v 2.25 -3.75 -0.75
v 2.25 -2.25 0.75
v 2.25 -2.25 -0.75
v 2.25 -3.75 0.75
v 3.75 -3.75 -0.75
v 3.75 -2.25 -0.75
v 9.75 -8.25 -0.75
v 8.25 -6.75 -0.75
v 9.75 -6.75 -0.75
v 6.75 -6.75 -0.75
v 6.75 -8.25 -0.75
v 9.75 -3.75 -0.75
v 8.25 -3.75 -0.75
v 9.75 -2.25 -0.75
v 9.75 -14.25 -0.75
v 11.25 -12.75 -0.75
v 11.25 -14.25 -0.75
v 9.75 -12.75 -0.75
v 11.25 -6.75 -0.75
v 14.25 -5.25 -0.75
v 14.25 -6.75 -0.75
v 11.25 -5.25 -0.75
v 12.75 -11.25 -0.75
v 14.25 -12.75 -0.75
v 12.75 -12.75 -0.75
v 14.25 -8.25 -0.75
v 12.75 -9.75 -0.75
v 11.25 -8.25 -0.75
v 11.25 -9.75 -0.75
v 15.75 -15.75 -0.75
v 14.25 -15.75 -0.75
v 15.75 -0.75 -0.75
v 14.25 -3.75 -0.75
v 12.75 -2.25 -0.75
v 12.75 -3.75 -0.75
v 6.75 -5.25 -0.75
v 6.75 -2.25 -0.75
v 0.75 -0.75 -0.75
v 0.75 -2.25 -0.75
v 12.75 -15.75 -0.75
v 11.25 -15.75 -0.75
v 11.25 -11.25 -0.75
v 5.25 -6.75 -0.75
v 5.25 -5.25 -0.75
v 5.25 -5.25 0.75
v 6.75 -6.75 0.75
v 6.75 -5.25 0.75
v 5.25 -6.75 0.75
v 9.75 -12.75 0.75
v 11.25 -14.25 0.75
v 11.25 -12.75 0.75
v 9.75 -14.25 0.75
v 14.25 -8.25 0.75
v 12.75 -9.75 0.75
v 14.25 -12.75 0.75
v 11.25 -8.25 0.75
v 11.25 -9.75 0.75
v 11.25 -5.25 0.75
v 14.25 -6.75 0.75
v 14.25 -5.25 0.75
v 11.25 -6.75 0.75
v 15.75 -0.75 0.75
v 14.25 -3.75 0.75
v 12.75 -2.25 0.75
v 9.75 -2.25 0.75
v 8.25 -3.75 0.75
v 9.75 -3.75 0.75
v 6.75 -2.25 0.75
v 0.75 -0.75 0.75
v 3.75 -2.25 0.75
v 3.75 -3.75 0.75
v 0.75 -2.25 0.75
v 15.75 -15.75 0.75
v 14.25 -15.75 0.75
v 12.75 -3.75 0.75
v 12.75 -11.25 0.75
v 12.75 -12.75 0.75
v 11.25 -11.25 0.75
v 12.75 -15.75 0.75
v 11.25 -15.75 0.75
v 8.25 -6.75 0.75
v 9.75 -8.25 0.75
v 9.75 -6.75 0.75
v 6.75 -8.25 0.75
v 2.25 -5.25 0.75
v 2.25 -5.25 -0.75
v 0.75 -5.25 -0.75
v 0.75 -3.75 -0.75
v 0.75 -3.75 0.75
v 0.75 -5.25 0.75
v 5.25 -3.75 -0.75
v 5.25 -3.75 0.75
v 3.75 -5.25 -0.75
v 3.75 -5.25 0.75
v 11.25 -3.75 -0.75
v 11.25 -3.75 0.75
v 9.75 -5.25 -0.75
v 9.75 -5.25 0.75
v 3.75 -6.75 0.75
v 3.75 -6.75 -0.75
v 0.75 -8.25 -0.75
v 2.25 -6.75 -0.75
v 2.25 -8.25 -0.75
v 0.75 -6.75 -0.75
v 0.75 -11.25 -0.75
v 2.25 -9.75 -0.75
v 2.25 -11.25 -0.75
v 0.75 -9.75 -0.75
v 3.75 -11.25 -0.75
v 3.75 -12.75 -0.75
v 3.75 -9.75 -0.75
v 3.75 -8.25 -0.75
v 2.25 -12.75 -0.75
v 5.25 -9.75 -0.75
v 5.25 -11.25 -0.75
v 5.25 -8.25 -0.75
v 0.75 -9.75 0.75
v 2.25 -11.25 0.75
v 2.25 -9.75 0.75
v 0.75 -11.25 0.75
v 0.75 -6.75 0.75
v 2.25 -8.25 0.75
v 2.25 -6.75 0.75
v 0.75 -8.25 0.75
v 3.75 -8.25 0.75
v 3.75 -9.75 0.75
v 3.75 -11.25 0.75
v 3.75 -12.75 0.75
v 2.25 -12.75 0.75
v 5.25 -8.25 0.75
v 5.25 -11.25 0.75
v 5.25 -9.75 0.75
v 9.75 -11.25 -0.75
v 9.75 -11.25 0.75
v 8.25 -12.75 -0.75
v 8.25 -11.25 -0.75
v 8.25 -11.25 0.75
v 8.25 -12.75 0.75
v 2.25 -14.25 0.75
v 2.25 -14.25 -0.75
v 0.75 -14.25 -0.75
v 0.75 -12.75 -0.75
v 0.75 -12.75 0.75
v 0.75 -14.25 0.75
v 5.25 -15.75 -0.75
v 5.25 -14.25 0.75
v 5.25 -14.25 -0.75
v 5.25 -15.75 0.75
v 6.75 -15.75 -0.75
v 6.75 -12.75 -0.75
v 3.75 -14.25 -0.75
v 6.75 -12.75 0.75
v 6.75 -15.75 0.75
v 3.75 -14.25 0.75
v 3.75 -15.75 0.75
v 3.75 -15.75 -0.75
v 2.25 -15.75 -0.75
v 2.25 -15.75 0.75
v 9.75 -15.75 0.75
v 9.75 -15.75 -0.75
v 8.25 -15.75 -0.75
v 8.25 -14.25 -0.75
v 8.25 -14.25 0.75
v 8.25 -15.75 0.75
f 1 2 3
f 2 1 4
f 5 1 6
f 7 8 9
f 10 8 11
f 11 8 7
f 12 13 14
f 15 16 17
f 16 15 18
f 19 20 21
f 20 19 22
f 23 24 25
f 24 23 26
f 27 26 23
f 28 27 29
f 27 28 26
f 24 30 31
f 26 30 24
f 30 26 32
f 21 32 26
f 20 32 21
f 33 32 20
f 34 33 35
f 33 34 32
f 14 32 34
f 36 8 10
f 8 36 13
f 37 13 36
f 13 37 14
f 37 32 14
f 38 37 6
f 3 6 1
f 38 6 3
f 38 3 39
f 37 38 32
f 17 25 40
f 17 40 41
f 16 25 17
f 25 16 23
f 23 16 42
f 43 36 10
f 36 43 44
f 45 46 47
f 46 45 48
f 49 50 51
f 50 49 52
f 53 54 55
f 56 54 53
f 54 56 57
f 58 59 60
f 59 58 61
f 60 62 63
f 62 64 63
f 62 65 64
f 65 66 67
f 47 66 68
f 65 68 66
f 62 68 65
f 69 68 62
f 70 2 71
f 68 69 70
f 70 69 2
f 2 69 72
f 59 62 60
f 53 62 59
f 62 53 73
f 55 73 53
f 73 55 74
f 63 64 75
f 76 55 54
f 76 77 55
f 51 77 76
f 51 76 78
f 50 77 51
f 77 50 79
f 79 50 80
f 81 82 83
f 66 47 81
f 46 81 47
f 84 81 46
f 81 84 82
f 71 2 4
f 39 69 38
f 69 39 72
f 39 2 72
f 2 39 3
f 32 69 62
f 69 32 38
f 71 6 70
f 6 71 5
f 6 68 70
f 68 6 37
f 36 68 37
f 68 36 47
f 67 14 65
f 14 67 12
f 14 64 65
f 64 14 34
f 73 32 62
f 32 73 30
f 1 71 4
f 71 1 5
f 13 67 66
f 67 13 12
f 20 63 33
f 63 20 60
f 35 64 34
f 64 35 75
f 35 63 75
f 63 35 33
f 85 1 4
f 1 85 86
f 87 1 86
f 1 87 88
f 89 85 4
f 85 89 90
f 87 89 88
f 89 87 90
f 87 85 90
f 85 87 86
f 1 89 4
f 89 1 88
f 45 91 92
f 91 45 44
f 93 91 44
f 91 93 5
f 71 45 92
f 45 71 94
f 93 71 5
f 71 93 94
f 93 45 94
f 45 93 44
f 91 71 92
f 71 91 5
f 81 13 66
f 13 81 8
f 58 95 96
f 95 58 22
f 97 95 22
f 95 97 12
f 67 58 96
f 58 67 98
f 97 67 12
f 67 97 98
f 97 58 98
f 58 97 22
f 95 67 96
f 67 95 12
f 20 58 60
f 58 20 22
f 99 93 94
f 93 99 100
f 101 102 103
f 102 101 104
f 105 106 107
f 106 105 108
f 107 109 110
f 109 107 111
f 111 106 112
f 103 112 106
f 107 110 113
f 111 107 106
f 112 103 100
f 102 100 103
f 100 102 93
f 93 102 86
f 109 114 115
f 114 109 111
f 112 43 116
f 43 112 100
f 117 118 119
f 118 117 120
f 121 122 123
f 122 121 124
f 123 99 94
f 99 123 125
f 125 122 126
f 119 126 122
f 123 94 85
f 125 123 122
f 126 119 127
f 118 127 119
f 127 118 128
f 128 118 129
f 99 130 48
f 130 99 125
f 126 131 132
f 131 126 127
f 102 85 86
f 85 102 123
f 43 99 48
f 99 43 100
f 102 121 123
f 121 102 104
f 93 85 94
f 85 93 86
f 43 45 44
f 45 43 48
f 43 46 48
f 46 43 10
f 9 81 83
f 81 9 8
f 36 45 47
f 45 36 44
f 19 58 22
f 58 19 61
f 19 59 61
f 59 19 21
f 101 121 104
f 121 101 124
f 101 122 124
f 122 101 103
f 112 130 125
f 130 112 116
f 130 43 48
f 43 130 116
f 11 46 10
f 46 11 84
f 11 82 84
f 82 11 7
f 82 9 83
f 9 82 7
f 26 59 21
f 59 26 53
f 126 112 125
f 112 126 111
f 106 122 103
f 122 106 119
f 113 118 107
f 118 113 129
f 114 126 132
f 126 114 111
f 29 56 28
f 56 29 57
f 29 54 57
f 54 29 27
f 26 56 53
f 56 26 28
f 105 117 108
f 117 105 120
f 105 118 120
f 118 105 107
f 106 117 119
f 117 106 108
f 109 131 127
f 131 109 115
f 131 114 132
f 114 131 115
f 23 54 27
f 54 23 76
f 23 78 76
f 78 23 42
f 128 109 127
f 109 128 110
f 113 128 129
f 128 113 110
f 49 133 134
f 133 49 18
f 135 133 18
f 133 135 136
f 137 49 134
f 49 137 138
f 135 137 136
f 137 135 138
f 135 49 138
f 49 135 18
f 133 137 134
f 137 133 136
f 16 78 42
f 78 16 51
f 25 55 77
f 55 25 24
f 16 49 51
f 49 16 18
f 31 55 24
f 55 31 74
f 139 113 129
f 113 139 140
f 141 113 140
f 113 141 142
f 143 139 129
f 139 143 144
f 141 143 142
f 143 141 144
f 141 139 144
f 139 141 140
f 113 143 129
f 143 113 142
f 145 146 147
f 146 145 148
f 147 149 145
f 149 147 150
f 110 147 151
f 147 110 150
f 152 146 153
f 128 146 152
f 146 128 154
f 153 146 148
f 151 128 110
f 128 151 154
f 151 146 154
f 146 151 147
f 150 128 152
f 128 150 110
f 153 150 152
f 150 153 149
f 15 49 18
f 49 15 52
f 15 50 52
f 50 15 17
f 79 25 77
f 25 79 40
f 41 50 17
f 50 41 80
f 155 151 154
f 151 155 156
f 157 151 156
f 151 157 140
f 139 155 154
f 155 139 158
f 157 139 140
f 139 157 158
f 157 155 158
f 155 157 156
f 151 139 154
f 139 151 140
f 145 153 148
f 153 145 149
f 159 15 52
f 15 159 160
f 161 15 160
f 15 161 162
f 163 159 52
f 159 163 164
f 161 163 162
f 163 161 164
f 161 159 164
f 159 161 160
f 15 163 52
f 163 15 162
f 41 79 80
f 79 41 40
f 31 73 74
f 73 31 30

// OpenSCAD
rotate([180,0,0]){
translate([1.5,1.5,0])  cube(size = [1.5,1.5,1.5], center = true);
translate([3,1.5,0])  cube(size = [1.5,1.5,1.5], center = true);
translate([4.5,1.5,0])  cube(size = [1.5,1.5,1.5], center = true);
translate([6,1.5,0])  cube(size = [1.5,1.5,1.5], center = true);
translate([7.5,1.5,0])  cube(size = [1.5,1.5,1.5], center = true);
translate([9,1.5,0])  cube(size = [1.5,1.5,1.5], center = true);
translate([10.5,1.5,0])  cube(size = [1.5,1.5,1.5], center = true);
translate([12,1.5,0])  cube(size = [1.5,1.5,1.5], center = true);
translate([13.5,1.5,0])  cube(size = [1.5,1.5,1.5], center = true);
translate([15,1.5,0])  cube(size = [1.5,1.5,1.5], center = true);
translate([15,1.5,0])  cube(size = [1.5,1.5,1.5], center = true);
translate([3,3,0])  cube(size = [1.5,1.5,1.5], center = true);
translate([3,3,0])  cube(size = [1.5,1.5,1.5], center = true);
translate([3,3,0])  cube(size = [1.5,1.5,1.5], center = true);
translate([7.5,3,0])  cube(size = [1.5,1.5,1.5], center = true);
translate([9,3,0])  cube(size = [1.5,1.5,1.5], center = true);
translate([9,3,0])  cube(size = [1.5,1.5,1.5], center = true);
translate([9,3,0])  cube(size = [1.5,1.5,1.5], center = true);
translate([13.5,3,0])  cube(size = [1.5,1.5,1.5], center = true);
translate([15,3,0])  cube(size = [1.5,1.5,1.5], center = true);
translate([1.5,4.5,0])  cube(size = [1.5,1.5,1.5], center = true);
translate([1.5,4.5,0])  cube(size = [1.5,1.5,1.5], center = true);
translate([4.5,4.5,0])  cube(size = [1.5,1.5,1.5], center = true);
translate([4.5,4.5,0])  cube(size = [1.5,1.5,1.5], center = true);
translate([7.5,4.5,0])  cube(size = [1.5,1.5,1.5], center = true);
translate([7.5,4.5,0])  cube(size = [1.5,1.5,1.5], center = true);
translate([10.5,4.5,0])  cube(size = [1.5,1.5,1.5], center = true);
translate([10.5,4.5,0])  cube(size = [1.5,1.5,1.5], center = true);
translate([10.5,4.5,0])  cube(size = [1.5,1.5,1.5], center = true);
translate([15,4.5,0])  cube(size = [1.5,1.5,1.5], center = true);
translate([15,4.5,0])  cube(size = [1.5,1.5,1.5], center = true);
translate([3,6,0])  cube(size = [1.5,1.5,1.5], center = true);
translate([3,6,0])  cube(size = [1.5,1.5,1.5], center = true);
translate([6,6,0])  cube(size = [1.5,1.5,1.5], center = true);
translate([7.5,6,0])  cube(size = [1.5,1.5,1.5], center = true);
translate([7.5,6,0])  cube(size = [1.5,1.5,1.5], center = true);
translate([7.5,6,0])  cube(size = [1.5,1.5,1.5], center = true);
translate([12,6,0])  cube(size = [1.5,1.5,1.5], center = true);
translate([13.5,6,0])  cube(size = [1.5,1.5,1.5], center = true);
translate([15,6,0])  cube(size = [1.5,1.5,1.5], center = true);
translate([1.5,7.5,0])  cube(size = [1.5,1.5,1.5], center = true);
translate([3,7.5,0])  cube(size = [1.5,1.5,1.5], center = true);
translate([4.5,7.5,0])  cube(size = [1.5,1.5,1.5], center = true);
translate([4.5,7.5,0])  cube(size = [1.5,1.5,1.5], center = true);
translate([7.5,7.5,0])  cube(size = [1.5,1.5,1.5], center = true);
translate([9,7.5,0])  cube(size = [1.5,1.5,1.5], center = true);
translate([9,7.5,0])  cube(size = [1.5,1.5,1.5], center = true);
translate([9,7.5,0])  cube(size = [1.5,1.5,1.5], center = true);
translate([9,7.5,0])  cube(size = [1.5,1.5,1.5], center = true);
translate([15,7.5,0])  cube(size = [1.5,1.5,1.5], center = true);
translate([15,7.5,0])  cube(size = [1.5,1.5,1.5], center = true);
translate([3,9,0])  cube(size = [1.5,1.5,1.5], center = true);
translate([3,9,0])  cube(size = [1.5,1.5,1.5], center = true);
translate([3,9,0])  cube(size = [1.5,1.5,1.5], center = true);
translate([3,9,0])  cube(size = [1.5,1.5,1.5], center = true);
translate([3,9,0])  cube(size = [1.5,1.5,1.5], center = true);
translate([3,9,0])  cube(size = [1.5,1.5,1.5], center = true);
translate([12,9,0])  cube(size = [1.5,1.5,1.5], center = true);
translate([13.5,9,0])  cube(size = [1.5,1.5,1.5], center = true);
translate([15,9,0])  cube(size = [1.5,1.5,1.5], center = true);
translate([1.5,10.5,0])  cube(size = [1.5,1.5,1.5], center = true);
translate([3,10.5,0])  cube(size = [1.5,1.5,1.5], center = true);
translate([4.5,10.5,0])  cube(size = [1.5,1.5,1.5], center = true);
translate([4.5,10.5,0])  cube(size = [1.5,1.5,1.5], center = true);
translate([4.5,10.5,0])  cube(size = [1.5,1.5,1.5], center = true);
translate([4.5,10.5,0])  cube(size = [1.5,1.5,1.5], center = true);
translate([4.5,10.5,0])  cube(size = [1.5,1.5,1.5], center = true);
translate([4.5,10.5,0])  cube(size = [1.5,1.5,1.5], center = true);
translate([13.5,10.5,0])  cube(size = [1.5,1.5,1.5], center = true);
translate([15,10.5,0])  cube(size = [1.5,1.5,1.5], center = true);
translate([15,10.5,0])  cube(size = [1.5,1.5,1.5], center = true);
translate([3,12,0])  cube(size = [1.5,1.5,1.5], center = true);
translate([3,12,0])  cube(size = [1.5,1.5,1.5], center = true);
translate([3,12,0])  cube(size = [1.5,1.5,1.5], center = true);
translate([3,12,0])  cube(size = [1.5,1.5,1.5], center = true);
translate([9,12,0])  cube(size = [1.5,1.5,1.5], center = true);
translate([9,12,0])  cube(size = [1.5,1.5,1.5], center = true);
translate([12,12,0])  cube(size = [1.5,1.5,1.5], center = true);
translate([13.5,12,0])  cube(size = [1.5,1.5,1.5], center = true);
translate([15,12,0])  cube(size = [1.5,1.5,1.5], center = true);
translate([1.5,13.5,0])  cube(size = [1.5,1.5,1.5], center = true);
translate([1.5,13.5,0])  cube(size = [1.5,1.5,1.5], center = true);
translate([4.5,13.5,0])  cube(size = [1.5,1.5,1.5], center = true);
translate([6,13.5,0])  cube(size = [1.5,1.5,1.5], center = true);
translate([6,13.5,0])  cube(size = [1.5,1.5,1.5], center = true);
translate([6,13.5,0])  cube(size = [1.5,1.5,1.5], center = true);
translate([10.5,13.5,0])  cube(size = [1.5,1.5,1.5], center = true);
translate([12,13.5,0])  cube(size = [1.5,1.5,1.5], center = true);
translate([12,13.5,0])  cube(size = [1.5,1.5,1.5], center = true);
translate([15,13.5,0])  cube(size = [1.5,1.5,1.5], center = true);
translate([15,13.5,0])  cube(size = [1.5,1.5,1.5], center = true);
translate([3,15,0])  cube(size = [1.5,1.5,1.5], center = true);
translate([3,15,0])  cube(size = [1.5,1.5,1.5], center = true);
translate([6,15,0])  cube(size = [1.5,1.5,1.5], center = true);
translate([6,15,0])  cube(size = [1.5,1.5,1.5], center = true);
translate([9,15,0])  cube(size = [1.5,1.5,1.5], center = true);
translate([9,15,0])  cube(size = [1.5,1.5,1.5], center = true);
translate([12,15,0])  cube(size = [1.5,1.5,1.5], center = true);
translate([12,15,0])  cube(size = [1.5,1.5,1.5], center = true);
translate([15,15,0])  cube(size = [1.5,1.5,1.5], center = true);
}
